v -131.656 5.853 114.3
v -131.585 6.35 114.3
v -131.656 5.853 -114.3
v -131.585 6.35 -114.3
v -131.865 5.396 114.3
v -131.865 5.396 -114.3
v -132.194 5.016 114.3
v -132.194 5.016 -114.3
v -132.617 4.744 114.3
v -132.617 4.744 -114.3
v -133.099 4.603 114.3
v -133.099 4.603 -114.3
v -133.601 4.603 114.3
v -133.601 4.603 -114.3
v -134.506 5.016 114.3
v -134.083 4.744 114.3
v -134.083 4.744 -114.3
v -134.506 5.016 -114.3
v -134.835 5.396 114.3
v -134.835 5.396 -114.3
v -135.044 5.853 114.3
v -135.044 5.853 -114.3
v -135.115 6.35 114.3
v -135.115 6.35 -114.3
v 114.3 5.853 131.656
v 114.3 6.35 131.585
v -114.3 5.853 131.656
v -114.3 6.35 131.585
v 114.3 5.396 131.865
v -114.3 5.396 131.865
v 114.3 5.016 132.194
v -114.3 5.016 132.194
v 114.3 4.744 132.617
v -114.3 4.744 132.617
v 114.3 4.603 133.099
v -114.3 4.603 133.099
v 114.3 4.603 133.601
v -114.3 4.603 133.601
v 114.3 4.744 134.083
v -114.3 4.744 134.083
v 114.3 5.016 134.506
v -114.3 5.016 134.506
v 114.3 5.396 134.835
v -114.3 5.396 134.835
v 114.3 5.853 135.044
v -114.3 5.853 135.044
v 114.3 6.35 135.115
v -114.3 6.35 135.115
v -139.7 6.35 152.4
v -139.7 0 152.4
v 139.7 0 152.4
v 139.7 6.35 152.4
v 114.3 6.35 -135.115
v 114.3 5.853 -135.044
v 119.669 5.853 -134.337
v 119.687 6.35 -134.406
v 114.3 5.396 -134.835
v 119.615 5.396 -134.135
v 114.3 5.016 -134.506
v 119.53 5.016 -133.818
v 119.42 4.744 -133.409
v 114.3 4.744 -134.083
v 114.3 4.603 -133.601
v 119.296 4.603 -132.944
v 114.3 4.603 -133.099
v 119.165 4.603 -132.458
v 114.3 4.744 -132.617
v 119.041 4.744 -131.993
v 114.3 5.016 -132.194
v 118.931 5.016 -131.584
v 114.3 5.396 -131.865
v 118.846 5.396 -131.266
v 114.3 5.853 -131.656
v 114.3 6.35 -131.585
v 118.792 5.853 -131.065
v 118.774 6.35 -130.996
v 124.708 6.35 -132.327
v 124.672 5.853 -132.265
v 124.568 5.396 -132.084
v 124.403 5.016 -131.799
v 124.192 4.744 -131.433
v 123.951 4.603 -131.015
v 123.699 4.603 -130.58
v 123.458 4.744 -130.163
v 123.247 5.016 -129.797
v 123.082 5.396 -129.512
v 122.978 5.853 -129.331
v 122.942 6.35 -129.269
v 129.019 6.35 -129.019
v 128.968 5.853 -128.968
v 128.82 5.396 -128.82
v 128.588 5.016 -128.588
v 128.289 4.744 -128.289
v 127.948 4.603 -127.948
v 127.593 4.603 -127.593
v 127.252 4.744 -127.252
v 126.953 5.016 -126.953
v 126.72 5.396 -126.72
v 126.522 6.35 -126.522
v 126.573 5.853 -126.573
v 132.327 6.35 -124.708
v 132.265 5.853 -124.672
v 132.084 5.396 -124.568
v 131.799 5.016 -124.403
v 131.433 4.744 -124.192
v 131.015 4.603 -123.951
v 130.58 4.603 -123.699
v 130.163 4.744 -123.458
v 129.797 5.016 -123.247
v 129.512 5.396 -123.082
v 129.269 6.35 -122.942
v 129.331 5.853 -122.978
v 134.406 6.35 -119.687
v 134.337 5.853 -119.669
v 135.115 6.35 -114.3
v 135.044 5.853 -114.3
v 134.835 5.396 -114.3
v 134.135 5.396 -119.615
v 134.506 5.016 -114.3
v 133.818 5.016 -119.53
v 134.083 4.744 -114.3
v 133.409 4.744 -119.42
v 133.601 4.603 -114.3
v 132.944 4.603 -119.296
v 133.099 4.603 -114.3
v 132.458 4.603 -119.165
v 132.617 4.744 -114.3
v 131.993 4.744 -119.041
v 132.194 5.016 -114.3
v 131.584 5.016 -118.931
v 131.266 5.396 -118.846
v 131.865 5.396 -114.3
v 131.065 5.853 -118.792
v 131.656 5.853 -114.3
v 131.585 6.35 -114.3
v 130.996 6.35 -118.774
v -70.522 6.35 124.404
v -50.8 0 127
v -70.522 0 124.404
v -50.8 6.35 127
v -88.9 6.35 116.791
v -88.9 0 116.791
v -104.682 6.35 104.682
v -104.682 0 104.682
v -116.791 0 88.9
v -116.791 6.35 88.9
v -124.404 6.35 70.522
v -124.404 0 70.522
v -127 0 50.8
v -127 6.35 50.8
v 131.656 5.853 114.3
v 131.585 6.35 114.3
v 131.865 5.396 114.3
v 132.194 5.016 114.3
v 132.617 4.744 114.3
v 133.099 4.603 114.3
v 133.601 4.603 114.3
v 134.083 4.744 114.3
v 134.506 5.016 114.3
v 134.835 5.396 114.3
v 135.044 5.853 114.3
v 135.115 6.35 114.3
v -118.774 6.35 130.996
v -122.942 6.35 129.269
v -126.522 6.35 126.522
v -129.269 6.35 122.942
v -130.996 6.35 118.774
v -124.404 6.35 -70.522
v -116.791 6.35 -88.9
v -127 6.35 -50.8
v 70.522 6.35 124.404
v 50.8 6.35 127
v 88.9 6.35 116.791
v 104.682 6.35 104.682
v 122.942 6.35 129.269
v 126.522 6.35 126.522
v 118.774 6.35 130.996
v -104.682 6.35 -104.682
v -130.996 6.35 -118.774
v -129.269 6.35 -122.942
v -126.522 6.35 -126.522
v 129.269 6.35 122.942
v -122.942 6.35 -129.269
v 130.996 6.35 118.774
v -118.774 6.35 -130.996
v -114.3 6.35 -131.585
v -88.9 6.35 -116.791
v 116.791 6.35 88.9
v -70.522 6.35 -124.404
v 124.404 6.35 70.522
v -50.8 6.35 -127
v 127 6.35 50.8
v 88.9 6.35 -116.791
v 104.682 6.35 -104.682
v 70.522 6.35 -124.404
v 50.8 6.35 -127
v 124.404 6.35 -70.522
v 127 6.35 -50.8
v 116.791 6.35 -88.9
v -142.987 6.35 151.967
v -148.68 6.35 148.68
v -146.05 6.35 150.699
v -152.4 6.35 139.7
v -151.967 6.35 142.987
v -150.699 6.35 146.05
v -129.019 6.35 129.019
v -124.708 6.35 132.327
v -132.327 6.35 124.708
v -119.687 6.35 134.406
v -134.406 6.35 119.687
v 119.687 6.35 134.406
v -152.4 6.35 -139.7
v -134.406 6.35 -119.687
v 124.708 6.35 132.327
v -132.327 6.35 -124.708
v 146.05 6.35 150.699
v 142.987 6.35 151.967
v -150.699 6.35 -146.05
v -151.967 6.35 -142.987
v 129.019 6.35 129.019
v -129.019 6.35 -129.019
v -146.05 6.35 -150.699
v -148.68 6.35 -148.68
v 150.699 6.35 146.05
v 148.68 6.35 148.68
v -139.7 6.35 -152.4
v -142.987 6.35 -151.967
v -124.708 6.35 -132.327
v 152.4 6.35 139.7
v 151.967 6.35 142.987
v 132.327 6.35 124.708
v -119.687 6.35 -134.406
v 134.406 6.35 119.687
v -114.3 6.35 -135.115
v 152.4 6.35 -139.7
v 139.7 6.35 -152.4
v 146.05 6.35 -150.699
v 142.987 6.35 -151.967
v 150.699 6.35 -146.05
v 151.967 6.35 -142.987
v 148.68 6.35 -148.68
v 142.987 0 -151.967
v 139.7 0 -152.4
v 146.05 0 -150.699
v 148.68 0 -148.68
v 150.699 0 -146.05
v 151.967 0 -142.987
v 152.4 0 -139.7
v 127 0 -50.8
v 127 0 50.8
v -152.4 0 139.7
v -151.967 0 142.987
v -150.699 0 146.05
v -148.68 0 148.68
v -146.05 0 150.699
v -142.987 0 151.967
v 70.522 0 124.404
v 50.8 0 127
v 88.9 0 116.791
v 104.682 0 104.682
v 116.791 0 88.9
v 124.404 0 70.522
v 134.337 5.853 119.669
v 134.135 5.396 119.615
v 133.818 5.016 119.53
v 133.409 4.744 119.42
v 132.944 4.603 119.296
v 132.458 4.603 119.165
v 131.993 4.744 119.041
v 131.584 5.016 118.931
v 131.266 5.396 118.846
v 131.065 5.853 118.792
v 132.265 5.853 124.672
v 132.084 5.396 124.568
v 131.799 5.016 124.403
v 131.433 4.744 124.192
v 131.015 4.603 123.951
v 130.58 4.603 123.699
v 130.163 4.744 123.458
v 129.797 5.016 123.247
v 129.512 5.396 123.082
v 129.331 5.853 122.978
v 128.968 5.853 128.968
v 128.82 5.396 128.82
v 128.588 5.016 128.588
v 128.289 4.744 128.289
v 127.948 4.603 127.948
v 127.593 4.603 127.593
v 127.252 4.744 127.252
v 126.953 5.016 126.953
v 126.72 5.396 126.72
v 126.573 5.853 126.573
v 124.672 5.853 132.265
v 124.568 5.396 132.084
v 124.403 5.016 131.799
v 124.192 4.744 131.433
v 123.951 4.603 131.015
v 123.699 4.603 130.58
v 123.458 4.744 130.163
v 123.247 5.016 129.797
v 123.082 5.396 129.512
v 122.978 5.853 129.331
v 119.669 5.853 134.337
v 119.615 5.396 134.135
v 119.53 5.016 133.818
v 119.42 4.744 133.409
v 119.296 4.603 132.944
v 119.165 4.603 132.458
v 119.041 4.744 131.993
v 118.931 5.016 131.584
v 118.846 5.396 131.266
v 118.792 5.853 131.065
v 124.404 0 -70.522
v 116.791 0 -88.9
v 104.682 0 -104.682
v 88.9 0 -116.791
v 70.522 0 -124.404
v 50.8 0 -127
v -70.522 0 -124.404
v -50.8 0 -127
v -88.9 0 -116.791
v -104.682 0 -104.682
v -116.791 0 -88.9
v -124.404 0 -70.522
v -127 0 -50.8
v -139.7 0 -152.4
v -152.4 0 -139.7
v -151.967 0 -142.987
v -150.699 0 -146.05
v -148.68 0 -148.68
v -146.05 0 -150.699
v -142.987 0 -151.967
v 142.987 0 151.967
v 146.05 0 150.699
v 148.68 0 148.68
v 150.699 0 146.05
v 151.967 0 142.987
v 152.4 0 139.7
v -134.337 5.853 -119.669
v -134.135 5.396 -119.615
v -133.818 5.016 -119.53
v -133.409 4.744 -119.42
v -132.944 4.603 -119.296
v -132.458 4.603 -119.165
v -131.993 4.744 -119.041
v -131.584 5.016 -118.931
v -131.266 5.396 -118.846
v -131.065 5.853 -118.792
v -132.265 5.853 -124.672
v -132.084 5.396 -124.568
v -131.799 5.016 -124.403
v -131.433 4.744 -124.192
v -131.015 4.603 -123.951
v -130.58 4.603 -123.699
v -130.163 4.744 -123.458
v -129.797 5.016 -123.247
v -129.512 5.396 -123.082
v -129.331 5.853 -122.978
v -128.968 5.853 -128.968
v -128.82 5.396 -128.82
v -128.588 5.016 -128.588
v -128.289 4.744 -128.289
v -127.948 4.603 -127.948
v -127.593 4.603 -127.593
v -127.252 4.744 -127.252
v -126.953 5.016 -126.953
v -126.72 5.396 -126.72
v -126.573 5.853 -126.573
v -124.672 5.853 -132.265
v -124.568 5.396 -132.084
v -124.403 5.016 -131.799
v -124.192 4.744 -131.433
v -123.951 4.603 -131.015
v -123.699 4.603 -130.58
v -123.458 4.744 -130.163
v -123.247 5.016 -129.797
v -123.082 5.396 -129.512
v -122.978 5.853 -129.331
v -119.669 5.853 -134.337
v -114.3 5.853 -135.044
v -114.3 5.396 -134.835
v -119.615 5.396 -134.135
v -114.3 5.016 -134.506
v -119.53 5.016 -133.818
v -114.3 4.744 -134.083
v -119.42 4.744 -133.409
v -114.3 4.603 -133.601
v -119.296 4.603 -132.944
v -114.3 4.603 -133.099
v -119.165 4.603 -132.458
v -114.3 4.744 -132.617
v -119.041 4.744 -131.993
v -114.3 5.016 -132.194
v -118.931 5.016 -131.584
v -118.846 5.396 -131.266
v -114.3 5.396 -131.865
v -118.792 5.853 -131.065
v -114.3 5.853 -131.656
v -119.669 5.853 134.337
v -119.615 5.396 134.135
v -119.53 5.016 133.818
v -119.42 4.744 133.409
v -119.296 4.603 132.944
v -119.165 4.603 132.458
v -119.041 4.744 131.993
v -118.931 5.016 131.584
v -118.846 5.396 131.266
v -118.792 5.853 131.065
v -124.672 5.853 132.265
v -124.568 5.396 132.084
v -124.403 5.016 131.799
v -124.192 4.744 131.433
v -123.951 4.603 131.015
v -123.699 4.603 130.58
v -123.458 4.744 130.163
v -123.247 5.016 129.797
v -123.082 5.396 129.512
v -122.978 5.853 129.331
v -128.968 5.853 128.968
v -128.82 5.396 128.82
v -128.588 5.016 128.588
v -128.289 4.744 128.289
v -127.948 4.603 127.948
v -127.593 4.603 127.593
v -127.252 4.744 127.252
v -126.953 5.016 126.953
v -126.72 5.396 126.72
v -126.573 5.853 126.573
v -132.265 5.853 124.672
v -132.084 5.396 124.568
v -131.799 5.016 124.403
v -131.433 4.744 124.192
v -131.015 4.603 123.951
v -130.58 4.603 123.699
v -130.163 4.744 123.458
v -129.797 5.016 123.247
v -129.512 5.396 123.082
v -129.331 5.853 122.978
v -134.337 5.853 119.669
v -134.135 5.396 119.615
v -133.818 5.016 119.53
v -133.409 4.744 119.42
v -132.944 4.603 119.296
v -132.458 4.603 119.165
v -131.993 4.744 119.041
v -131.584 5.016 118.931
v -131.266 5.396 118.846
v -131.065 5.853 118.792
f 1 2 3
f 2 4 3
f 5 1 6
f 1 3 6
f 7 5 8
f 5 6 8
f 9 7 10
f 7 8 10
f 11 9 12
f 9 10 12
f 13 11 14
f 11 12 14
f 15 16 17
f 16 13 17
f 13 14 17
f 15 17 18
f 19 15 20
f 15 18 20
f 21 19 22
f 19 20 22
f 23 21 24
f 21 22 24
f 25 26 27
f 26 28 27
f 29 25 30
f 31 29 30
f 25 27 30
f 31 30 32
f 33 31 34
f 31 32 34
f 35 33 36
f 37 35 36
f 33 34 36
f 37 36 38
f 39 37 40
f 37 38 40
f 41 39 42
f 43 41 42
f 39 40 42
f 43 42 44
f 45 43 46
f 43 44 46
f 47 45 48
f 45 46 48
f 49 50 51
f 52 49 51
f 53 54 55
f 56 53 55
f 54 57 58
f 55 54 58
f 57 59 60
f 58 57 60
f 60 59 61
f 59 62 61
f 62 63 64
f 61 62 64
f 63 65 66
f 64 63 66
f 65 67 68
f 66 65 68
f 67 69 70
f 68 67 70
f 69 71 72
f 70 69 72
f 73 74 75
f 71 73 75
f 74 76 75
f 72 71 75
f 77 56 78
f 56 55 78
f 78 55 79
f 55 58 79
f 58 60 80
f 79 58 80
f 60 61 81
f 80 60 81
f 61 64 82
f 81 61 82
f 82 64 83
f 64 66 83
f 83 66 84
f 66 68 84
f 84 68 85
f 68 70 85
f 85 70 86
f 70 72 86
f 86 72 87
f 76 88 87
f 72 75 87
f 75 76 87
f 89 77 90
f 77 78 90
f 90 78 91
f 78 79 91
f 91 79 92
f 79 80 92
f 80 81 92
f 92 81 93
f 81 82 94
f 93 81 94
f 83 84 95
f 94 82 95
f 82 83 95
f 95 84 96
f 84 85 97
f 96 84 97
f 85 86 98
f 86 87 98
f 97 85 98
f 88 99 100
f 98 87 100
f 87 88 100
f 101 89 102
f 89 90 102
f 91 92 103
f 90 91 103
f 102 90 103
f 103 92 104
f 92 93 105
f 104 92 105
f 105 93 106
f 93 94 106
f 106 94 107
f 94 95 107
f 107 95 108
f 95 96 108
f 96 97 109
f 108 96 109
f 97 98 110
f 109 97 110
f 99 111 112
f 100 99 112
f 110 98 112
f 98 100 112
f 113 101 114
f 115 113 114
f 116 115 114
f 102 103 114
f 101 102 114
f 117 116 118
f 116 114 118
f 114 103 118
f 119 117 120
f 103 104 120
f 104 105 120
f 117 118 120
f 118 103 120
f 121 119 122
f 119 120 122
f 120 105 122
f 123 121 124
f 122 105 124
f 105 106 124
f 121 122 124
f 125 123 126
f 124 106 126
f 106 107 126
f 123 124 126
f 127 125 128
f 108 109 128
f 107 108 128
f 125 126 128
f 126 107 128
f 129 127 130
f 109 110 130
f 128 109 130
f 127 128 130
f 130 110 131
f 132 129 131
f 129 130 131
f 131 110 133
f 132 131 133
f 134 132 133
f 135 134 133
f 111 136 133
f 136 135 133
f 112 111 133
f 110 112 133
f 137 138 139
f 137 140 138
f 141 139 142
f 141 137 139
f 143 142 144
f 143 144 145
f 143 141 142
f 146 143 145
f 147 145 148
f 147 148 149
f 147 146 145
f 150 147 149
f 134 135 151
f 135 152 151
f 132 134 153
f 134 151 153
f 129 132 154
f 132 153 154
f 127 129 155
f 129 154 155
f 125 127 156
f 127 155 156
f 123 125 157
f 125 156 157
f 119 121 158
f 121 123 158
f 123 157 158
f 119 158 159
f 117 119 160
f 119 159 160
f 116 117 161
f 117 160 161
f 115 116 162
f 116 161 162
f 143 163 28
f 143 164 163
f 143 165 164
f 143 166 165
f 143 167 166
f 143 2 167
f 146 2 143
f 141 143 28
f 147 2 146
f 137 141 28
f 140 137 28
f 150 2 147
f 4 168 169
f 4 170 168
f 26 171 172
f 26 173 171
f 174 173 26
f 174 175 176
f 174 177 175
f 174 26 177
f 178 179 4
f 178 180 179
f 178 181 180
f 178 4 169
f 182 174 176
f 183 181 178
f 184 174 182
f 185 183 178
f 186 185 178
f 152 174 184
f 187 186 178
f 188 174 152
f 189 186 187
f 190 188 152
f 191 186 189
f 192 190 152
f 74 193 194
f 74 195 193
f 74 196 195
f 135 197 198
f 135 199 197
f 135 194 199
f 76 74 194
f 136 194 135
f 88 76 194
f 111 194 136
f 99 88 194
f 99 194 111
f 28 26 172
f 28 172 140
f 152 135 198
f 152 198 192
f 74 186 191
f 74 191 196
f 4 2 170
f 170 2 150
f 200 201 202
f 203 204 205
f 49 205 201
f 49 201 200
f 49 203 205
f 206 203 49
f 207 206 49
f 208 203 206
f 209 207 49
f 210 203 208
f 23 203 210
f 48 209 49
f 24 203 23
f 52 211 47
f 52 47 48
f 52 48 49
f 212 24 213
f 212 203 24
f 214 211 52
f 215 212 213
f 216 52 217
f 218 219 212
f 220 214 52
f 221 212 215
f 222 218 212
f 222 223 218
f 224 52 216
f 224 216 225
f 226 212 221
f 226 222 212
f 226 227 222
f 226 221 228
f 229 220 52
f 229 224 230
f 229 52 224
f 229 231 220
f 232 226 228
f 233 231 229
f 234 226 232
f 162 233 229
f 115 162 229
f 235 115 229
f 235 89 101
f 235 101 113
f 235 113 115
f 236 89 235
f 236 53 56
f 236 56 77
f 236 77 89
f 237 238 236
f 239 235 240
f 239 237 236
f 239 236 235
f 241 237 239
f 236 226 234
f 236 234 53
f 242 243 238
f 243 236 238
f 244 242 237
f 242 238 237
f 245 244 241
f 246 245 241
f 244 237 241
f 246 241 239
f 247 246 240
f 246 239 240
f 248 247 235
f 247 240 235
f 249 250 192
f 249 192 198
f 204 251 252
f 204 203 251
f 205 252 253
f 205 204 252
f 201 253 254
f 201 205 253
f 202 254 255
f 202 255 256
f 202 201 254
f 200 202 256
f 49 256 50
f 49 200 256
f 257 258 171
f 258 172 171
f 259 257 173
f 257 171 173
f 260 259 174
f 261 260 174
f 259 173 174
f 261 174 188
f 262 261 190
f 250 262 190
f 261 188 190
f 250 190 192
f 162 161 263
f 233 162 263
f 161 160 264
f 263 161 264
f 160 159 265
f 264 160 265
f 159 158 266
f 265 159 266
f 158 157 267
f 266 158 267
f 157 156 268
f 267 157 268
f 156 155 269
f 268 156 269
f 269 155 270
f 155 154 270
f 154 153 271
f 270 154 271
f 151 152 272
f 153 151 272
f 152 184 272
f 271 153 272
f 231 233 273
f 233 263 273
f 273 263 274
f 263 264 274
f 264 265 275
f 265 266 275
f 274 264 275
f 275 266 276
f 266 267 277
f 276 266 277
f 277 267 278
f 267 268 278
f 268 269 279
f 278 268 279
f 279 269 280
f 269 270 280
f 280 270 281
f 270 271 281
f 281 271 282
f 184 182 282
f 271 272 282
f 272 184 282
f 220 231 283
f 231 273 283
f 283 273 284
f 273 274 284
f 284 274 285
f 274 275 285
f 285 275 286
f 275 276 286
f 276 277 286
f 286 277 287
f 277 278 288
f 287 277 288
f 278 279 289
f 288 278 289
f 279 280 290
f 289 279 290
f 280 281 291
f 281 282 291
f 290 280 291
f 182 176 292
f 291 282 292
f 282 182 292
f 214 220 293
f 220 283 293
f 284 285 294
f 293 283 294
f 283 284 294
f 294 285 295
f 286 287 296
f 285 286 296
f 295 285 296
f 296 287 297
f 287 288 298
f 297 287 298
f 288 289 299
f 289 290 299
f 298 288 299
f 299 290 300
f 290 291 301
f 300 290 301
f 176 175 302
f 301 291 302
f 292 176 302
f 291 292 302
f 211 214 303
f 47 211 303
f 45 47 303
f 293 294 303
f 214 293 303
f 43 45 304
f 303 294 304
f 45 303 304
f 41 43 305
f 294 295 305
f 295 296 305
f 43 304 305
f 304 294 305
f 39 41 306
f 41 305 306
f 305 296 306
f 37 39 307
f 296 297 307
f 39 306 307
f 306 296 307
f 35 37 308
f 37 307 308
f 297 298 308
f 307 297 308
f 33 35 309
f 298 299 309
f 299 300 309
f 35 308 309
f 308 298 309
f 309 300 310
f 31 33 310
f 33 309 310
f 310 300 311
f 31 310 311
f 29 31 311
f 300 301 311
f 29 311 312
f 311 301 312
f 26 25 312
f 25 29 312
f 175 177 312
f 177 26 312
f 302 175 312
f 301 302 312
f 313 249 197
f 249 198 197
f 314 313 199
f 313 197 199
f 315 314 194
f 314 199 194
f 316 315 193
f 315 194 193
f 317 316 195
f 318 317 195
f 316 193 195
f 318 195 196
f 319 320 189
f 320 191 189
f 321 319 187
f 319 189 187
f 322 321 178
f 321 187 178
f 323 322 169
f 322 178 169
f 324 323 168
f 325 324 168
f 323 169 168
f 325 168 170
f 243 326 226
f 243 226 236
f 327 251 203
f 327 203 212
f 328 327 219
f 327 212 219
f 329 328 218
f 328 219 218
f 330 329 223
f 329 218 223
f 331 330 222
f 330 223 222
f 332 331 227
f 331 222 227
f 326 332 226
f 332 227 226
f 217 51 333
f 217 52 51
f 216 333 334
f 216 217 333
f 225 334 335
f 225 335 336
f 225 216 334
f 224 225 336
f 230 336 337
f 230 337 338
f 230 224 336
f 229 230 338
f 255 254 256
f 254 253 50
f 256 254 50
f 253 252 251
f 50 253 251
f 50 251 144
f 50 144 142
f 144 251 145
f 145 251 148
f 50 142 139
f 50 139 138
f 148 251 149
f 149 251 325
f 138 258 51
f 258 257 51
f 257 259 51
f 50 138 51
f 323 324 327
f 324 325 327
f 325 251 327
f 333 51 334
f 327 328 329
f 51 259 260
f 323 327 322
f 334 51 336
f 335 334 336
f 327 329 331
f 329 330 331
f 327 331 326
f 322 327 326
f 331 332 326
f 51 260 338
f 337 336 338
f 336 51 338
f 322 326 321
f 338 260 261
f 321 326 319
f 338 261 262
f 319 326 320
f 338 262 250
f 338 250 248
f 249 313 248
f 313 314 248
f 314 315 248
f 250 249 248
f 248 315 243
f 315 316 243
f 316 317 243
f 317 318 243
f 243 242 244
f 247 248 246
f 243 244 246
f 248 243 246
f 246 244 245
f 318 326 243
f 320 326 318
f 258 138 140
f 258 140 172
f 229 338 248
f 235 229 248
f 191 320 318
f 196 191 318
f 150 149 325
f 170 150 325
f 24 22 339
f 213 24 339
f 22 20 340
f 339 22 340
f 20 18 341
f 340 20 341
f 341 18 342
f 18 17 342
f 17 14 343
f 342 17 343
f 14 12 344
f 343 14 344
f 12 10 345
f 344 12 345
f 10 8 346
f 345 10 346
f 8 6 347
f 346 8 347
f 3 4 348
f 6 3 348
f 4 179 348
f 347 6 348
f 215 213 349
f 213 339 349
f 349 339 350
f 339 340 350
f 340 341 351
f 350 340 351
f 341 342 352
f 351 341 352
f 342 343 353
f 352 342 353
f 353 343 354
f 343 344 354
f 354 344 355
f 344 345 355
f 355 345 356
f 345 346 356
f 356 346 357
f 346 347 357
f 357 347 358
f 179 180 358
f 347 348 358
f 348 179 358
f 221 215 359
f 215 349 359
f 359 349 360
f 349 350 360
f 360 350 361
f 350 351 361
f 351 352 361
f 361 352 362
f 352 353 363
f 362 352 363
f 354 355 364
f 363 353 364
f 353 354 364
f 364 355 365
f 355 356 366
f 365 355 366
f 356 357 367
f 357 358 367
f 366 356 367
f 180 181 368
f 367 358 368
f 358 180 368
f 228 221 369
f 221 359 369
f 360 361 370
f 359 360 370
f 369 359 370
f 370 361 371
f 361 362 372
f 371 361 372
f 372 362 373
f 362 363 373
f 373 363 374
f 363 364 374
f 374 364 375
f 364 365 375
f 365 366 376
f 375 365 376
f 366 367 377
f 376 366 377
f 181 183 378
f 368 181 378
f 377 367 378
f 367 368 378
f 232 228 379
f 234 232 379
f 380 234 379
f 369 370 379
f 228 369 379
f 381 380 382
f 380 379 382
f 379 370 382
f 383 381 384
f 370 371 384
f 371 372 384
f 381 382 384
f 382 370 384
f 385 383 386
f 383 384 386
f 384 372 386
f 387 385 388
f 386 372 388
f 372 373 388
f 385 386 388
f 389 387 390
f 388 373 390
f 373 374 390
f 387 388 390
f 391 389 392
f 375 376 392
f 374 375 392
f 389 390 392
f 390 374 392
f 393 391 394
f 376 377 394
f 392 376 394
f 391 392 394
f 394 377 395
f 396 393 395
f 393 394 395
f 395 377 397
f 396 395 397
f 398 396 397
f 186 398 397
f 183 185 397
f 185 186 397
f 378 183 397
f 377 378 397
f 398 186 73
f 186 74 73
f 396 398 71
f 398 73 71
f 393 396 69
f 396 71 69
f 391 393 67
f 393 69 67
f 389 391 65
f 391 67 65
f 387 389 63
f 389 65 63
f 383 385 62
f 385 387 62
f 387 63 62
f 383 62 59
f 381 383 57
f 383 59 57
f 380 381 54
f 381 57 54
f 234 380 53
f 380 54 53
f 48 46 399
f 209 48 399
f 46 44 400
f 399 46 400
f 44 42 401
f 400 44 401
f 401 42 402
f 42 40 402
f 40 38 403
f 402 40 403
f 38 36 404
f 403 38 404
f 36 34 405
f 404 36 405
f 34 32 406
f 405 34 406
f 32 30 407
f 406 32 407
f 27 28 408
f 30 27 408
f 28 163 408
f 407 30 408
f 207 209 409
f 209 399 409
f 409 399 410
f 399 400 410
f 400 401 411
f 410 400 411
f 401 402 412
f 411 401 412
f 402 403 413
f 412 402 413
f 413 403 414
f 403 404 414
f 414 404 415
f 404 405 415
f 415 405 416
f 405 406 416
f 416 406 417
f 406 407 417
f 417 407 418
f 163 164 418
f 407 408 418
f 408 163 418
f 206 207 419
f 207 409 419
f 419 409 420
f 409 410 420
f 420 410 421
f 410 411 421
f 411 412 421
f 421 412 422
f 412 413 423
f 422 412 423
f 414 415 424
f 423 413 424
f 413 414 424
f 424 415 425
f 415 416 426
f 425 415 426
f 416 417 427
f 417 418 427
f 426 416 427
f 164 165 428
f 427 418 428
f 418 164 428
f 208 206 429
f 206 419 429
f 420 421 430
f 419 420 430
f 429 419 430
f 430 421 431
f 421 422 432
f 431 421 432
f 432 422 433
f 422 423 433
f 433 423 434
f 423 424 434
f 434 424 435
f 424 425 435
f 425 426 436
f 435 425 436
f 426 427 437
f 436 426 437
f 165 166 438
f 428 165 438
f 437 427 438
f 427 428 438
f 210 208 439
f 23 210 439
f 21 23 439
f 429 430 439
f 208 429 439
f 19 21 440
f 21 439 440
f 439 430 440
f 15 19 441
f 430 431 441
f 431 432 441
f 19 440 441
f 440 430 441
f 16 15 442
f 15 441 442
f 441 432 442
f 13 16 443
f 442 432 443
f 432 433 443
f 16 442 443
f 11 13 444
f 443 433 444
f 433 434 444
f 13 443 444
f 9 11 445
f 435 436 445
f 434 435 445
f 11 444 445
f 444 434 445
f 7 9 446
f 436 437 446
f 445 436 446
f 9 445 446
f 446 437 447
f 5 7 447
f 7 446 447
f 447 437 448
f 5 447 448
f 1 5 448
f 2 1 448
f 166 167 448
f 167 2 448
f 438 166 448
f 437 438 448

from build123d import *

# Parameters (mm, degrees)
SKETCH1_W           = 304.8
SKETCH1_H           = 304.8
SKETCH1_W_2         = 254
SKETCH1_H_2         = 254
BOSS_EXTRUDE1_DEPTH = 6.35
FILLET1_R           = 76.2
FILLET2_R           = 12.7
SKETCH4_R           = 1.7653


with BuildPart() as part:
    # Sketch1 → Boss-Extrude1 (new body)
    with BuildSketch(Plane(origin=(0, 0, 0), x_dir=(1, 0, 0), z_dir=(0, 1, 0))):
        Rectangle(SKETCH1_W, SKETCH1_H)
        Rectangle(SKETCH1_W_2, SKETCH1_H_2, mode=Mode.SUBTRACT)
    extrude(amount=BOSS_EXTRUDE1_DEPTH)

    # Fillet1
    fillet1_edges = [part.edges().sort_by_distance(p)[0] for p in [
        (-127, 3.175, -127),
        (-127, 3.175, 127),
        (127, 3.175, 127),
        (127, 3.175, -127),
    ]]
    fillet(fillet1_edges, radius=FILLET1_R)

    # Fillet2
    fillet2_edges = [part.edges().sort_by_distance(p)[0] for p in [
        (152.4, 3.175, 152.4),
        (-152.4, 3.175, 152.4),
        (-152.4, 3.175, -152.4),
        (152.4, 3.175, -152.4),
    ]]
    fillet(fillet2_edges, radius=FILLET2_R)

    # Cut-Sweep1: sweep along a path in Sketch3
    with BuildLine(Plane(origin=(0, 6.35, 0), x_dir=(1, 0, 0), z_dir=(0, 1, 0))) as cut_sweep1_path:
        Line((114.3, -133.35), (-114.3, -133.35))
        ThreePointArc((-114.3, -133.35), (-127.770384182, -127.770384182), (-133.35, -114.3))
        Line((-133.35, -114.3), (-133.35, 114.3))
        ThreePointArc((-133.35, 114.3), (-127.770384182, 127.770384182), (-114.3, 133.35))
        Line((-114.3, 133.35), (114.3, 133.35))
        ThreePointArc((114.3, 133.35), (127.770384182, 127.770384182), (133.35, 114.3))
        Line((133.35, 114.3), (133.35, -114.3))
        ThreePointArc((133.35, -114.3), (127.770384182, -127.770384182), (114.3, -133.35))
    # Sketch4 → Cut-Sweep1 (sweep, cut)
    with BuildSketch(Plane(origin=(0, 0, 0), x_dir=(0, 0, -1), z_dir=(1, 0, 0))):
        with Locations((133.35, 6.35)):
            Circle(SKETCH4_R)
    sweep(path=cut_sweep1_path.line, mode=Mode.SUBTRACT)


solid = part.part
